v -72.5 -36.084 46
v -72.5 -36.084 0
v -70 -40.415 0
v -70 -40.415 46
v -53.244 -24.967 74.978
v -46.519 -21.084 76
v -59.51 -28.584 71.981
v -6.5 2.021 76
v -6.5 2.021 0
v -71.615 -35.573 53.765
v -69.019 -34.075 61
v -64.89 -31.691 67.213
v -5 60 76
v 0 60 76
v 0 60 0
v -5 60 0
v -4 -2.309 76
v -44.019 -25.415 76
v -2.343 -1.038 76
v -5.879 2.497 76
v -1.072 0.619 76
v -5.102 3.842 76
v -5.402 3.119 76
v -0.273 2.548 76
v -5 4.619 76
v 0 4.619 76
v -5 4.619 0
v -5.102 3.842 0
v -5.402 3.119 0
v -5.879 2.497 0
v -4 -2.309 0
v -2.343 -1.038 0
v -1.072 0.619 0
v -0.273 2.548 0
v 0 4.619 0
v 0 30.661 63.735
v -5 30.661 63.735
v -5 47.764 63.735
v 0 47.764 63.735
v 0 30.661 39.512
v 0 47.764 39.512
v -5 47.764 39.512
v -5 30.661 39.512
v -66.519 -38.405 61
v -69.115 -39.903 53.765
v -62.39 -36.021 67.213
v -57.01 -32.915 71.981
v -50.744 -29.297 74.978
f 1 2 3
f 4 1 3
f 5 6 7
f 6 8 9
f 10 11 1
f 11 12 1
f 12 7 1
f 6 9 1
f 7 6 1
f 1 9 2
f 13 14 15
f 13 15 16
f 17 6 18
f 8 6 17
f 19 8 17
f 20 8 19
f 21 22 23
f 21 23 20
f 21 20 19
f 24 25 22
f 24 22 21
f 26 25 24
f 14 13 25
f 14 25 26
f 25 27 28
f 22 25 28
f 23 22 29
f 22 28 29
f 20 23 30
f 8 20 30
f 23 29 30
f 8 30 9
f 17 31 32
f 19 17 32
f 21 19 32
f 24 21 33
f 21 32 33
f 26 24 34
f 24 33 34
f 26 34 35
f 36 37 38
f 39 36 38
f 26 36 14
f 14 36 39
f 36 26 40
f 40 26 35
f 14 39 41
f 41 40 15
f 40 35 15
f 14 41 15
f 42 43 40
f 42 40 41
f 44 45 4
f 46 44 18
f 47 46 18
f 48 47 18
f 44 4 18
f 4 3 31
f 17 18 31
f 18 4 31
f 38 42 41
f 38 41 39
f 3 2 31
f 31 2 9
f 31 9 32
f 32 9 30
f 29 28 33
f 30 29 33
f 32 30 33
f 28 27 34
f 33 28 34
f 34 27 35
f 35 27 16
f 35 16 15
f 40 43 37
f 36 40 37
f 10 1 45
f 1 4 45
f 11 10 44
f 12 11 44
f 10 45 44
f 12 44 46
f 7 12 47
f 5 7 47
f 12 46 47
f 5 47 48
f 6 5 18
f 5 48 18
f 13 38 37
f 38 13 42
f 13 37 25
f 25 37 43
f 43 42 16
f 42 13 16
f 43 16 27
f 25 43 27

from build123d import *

# Parameters (mm, degrees)
ODGI_CIE_BAZOWE1_DEPTH     = 76
ZAOKR_GLENIE1_R            = 30
WYTNIJ_WYCI_GNI_CIE1_REACH = 120.035
SZKIC2_W                   = 24.223008457
SZKIC2_H                   = 17.102544726


# Sheet-metal steps are written as plain solids
with BuildPart() as part:
    # Szkic1 → Odgięcie bazowe1 (new body)
    with BuildSketch(Plane.XY):
        with BuildLine():
            Line((-70, -40.414518843), (-4, -2.309401077))
            ThreePointArc((-4, -2.309401077), (-1.07179677, 0.618802154), (0, 4.618802154))
            Line((0, 4.618802154), (0, 60))
            Line((0, 60), (-5, 60))
            Line((-5, 60), (-5, 4.618802154))
            ThreePointArc((-5, 4.618802154), (-5.401923789, 3.118802154), (-6.5, 2.020725942))
            Line((-6.5, 2.020725942), (-72.5, -36.084391824))
            Line((-72.5, -36.084391824), (-70, -40.414518843))
        make_face()
    extrude(amount=ODGI_CIE_BAZOWE1_DEPTH)

    # Zaokrąglenie1
    zaokr_glenie1_edges = [part.edges().sort_by_distance(p)[0] for p in [
        (-71.25, -38.249455334, 76),
    ]]
    fillet(zaokr_glenie1_edges, radius=ZAOKR_GLENIE1_R)

    # Szkic2 → Wytnij-wyciągnięcie1 (cut, up to next)
    with BuildSketch(Plane.ZY.offset(5), mode=Mode.PRIVATE) as wytnij_wyci_gni_cie1_sk1:
        with Locations((51.623539351, 39.212758495)):
            Rectangle(SZKIC2_W, SZKIC2_H)
    wytnij_wyci_gni_cie1_tool1 = extrude(wytnij_wyci_gni_cie1_sk1.sketch, amount=-WYTNIJ_WYCI_GNI_CIE1_REACH, mode=Mode.PRIVATE) & part.part
    add(wytnij_wyci_gni_cie1_tool1.solids().sort_by_distance((-5, 39.212758, 51.623539))[0], mode=Mode.SUBTRACT)


solid = part.part
